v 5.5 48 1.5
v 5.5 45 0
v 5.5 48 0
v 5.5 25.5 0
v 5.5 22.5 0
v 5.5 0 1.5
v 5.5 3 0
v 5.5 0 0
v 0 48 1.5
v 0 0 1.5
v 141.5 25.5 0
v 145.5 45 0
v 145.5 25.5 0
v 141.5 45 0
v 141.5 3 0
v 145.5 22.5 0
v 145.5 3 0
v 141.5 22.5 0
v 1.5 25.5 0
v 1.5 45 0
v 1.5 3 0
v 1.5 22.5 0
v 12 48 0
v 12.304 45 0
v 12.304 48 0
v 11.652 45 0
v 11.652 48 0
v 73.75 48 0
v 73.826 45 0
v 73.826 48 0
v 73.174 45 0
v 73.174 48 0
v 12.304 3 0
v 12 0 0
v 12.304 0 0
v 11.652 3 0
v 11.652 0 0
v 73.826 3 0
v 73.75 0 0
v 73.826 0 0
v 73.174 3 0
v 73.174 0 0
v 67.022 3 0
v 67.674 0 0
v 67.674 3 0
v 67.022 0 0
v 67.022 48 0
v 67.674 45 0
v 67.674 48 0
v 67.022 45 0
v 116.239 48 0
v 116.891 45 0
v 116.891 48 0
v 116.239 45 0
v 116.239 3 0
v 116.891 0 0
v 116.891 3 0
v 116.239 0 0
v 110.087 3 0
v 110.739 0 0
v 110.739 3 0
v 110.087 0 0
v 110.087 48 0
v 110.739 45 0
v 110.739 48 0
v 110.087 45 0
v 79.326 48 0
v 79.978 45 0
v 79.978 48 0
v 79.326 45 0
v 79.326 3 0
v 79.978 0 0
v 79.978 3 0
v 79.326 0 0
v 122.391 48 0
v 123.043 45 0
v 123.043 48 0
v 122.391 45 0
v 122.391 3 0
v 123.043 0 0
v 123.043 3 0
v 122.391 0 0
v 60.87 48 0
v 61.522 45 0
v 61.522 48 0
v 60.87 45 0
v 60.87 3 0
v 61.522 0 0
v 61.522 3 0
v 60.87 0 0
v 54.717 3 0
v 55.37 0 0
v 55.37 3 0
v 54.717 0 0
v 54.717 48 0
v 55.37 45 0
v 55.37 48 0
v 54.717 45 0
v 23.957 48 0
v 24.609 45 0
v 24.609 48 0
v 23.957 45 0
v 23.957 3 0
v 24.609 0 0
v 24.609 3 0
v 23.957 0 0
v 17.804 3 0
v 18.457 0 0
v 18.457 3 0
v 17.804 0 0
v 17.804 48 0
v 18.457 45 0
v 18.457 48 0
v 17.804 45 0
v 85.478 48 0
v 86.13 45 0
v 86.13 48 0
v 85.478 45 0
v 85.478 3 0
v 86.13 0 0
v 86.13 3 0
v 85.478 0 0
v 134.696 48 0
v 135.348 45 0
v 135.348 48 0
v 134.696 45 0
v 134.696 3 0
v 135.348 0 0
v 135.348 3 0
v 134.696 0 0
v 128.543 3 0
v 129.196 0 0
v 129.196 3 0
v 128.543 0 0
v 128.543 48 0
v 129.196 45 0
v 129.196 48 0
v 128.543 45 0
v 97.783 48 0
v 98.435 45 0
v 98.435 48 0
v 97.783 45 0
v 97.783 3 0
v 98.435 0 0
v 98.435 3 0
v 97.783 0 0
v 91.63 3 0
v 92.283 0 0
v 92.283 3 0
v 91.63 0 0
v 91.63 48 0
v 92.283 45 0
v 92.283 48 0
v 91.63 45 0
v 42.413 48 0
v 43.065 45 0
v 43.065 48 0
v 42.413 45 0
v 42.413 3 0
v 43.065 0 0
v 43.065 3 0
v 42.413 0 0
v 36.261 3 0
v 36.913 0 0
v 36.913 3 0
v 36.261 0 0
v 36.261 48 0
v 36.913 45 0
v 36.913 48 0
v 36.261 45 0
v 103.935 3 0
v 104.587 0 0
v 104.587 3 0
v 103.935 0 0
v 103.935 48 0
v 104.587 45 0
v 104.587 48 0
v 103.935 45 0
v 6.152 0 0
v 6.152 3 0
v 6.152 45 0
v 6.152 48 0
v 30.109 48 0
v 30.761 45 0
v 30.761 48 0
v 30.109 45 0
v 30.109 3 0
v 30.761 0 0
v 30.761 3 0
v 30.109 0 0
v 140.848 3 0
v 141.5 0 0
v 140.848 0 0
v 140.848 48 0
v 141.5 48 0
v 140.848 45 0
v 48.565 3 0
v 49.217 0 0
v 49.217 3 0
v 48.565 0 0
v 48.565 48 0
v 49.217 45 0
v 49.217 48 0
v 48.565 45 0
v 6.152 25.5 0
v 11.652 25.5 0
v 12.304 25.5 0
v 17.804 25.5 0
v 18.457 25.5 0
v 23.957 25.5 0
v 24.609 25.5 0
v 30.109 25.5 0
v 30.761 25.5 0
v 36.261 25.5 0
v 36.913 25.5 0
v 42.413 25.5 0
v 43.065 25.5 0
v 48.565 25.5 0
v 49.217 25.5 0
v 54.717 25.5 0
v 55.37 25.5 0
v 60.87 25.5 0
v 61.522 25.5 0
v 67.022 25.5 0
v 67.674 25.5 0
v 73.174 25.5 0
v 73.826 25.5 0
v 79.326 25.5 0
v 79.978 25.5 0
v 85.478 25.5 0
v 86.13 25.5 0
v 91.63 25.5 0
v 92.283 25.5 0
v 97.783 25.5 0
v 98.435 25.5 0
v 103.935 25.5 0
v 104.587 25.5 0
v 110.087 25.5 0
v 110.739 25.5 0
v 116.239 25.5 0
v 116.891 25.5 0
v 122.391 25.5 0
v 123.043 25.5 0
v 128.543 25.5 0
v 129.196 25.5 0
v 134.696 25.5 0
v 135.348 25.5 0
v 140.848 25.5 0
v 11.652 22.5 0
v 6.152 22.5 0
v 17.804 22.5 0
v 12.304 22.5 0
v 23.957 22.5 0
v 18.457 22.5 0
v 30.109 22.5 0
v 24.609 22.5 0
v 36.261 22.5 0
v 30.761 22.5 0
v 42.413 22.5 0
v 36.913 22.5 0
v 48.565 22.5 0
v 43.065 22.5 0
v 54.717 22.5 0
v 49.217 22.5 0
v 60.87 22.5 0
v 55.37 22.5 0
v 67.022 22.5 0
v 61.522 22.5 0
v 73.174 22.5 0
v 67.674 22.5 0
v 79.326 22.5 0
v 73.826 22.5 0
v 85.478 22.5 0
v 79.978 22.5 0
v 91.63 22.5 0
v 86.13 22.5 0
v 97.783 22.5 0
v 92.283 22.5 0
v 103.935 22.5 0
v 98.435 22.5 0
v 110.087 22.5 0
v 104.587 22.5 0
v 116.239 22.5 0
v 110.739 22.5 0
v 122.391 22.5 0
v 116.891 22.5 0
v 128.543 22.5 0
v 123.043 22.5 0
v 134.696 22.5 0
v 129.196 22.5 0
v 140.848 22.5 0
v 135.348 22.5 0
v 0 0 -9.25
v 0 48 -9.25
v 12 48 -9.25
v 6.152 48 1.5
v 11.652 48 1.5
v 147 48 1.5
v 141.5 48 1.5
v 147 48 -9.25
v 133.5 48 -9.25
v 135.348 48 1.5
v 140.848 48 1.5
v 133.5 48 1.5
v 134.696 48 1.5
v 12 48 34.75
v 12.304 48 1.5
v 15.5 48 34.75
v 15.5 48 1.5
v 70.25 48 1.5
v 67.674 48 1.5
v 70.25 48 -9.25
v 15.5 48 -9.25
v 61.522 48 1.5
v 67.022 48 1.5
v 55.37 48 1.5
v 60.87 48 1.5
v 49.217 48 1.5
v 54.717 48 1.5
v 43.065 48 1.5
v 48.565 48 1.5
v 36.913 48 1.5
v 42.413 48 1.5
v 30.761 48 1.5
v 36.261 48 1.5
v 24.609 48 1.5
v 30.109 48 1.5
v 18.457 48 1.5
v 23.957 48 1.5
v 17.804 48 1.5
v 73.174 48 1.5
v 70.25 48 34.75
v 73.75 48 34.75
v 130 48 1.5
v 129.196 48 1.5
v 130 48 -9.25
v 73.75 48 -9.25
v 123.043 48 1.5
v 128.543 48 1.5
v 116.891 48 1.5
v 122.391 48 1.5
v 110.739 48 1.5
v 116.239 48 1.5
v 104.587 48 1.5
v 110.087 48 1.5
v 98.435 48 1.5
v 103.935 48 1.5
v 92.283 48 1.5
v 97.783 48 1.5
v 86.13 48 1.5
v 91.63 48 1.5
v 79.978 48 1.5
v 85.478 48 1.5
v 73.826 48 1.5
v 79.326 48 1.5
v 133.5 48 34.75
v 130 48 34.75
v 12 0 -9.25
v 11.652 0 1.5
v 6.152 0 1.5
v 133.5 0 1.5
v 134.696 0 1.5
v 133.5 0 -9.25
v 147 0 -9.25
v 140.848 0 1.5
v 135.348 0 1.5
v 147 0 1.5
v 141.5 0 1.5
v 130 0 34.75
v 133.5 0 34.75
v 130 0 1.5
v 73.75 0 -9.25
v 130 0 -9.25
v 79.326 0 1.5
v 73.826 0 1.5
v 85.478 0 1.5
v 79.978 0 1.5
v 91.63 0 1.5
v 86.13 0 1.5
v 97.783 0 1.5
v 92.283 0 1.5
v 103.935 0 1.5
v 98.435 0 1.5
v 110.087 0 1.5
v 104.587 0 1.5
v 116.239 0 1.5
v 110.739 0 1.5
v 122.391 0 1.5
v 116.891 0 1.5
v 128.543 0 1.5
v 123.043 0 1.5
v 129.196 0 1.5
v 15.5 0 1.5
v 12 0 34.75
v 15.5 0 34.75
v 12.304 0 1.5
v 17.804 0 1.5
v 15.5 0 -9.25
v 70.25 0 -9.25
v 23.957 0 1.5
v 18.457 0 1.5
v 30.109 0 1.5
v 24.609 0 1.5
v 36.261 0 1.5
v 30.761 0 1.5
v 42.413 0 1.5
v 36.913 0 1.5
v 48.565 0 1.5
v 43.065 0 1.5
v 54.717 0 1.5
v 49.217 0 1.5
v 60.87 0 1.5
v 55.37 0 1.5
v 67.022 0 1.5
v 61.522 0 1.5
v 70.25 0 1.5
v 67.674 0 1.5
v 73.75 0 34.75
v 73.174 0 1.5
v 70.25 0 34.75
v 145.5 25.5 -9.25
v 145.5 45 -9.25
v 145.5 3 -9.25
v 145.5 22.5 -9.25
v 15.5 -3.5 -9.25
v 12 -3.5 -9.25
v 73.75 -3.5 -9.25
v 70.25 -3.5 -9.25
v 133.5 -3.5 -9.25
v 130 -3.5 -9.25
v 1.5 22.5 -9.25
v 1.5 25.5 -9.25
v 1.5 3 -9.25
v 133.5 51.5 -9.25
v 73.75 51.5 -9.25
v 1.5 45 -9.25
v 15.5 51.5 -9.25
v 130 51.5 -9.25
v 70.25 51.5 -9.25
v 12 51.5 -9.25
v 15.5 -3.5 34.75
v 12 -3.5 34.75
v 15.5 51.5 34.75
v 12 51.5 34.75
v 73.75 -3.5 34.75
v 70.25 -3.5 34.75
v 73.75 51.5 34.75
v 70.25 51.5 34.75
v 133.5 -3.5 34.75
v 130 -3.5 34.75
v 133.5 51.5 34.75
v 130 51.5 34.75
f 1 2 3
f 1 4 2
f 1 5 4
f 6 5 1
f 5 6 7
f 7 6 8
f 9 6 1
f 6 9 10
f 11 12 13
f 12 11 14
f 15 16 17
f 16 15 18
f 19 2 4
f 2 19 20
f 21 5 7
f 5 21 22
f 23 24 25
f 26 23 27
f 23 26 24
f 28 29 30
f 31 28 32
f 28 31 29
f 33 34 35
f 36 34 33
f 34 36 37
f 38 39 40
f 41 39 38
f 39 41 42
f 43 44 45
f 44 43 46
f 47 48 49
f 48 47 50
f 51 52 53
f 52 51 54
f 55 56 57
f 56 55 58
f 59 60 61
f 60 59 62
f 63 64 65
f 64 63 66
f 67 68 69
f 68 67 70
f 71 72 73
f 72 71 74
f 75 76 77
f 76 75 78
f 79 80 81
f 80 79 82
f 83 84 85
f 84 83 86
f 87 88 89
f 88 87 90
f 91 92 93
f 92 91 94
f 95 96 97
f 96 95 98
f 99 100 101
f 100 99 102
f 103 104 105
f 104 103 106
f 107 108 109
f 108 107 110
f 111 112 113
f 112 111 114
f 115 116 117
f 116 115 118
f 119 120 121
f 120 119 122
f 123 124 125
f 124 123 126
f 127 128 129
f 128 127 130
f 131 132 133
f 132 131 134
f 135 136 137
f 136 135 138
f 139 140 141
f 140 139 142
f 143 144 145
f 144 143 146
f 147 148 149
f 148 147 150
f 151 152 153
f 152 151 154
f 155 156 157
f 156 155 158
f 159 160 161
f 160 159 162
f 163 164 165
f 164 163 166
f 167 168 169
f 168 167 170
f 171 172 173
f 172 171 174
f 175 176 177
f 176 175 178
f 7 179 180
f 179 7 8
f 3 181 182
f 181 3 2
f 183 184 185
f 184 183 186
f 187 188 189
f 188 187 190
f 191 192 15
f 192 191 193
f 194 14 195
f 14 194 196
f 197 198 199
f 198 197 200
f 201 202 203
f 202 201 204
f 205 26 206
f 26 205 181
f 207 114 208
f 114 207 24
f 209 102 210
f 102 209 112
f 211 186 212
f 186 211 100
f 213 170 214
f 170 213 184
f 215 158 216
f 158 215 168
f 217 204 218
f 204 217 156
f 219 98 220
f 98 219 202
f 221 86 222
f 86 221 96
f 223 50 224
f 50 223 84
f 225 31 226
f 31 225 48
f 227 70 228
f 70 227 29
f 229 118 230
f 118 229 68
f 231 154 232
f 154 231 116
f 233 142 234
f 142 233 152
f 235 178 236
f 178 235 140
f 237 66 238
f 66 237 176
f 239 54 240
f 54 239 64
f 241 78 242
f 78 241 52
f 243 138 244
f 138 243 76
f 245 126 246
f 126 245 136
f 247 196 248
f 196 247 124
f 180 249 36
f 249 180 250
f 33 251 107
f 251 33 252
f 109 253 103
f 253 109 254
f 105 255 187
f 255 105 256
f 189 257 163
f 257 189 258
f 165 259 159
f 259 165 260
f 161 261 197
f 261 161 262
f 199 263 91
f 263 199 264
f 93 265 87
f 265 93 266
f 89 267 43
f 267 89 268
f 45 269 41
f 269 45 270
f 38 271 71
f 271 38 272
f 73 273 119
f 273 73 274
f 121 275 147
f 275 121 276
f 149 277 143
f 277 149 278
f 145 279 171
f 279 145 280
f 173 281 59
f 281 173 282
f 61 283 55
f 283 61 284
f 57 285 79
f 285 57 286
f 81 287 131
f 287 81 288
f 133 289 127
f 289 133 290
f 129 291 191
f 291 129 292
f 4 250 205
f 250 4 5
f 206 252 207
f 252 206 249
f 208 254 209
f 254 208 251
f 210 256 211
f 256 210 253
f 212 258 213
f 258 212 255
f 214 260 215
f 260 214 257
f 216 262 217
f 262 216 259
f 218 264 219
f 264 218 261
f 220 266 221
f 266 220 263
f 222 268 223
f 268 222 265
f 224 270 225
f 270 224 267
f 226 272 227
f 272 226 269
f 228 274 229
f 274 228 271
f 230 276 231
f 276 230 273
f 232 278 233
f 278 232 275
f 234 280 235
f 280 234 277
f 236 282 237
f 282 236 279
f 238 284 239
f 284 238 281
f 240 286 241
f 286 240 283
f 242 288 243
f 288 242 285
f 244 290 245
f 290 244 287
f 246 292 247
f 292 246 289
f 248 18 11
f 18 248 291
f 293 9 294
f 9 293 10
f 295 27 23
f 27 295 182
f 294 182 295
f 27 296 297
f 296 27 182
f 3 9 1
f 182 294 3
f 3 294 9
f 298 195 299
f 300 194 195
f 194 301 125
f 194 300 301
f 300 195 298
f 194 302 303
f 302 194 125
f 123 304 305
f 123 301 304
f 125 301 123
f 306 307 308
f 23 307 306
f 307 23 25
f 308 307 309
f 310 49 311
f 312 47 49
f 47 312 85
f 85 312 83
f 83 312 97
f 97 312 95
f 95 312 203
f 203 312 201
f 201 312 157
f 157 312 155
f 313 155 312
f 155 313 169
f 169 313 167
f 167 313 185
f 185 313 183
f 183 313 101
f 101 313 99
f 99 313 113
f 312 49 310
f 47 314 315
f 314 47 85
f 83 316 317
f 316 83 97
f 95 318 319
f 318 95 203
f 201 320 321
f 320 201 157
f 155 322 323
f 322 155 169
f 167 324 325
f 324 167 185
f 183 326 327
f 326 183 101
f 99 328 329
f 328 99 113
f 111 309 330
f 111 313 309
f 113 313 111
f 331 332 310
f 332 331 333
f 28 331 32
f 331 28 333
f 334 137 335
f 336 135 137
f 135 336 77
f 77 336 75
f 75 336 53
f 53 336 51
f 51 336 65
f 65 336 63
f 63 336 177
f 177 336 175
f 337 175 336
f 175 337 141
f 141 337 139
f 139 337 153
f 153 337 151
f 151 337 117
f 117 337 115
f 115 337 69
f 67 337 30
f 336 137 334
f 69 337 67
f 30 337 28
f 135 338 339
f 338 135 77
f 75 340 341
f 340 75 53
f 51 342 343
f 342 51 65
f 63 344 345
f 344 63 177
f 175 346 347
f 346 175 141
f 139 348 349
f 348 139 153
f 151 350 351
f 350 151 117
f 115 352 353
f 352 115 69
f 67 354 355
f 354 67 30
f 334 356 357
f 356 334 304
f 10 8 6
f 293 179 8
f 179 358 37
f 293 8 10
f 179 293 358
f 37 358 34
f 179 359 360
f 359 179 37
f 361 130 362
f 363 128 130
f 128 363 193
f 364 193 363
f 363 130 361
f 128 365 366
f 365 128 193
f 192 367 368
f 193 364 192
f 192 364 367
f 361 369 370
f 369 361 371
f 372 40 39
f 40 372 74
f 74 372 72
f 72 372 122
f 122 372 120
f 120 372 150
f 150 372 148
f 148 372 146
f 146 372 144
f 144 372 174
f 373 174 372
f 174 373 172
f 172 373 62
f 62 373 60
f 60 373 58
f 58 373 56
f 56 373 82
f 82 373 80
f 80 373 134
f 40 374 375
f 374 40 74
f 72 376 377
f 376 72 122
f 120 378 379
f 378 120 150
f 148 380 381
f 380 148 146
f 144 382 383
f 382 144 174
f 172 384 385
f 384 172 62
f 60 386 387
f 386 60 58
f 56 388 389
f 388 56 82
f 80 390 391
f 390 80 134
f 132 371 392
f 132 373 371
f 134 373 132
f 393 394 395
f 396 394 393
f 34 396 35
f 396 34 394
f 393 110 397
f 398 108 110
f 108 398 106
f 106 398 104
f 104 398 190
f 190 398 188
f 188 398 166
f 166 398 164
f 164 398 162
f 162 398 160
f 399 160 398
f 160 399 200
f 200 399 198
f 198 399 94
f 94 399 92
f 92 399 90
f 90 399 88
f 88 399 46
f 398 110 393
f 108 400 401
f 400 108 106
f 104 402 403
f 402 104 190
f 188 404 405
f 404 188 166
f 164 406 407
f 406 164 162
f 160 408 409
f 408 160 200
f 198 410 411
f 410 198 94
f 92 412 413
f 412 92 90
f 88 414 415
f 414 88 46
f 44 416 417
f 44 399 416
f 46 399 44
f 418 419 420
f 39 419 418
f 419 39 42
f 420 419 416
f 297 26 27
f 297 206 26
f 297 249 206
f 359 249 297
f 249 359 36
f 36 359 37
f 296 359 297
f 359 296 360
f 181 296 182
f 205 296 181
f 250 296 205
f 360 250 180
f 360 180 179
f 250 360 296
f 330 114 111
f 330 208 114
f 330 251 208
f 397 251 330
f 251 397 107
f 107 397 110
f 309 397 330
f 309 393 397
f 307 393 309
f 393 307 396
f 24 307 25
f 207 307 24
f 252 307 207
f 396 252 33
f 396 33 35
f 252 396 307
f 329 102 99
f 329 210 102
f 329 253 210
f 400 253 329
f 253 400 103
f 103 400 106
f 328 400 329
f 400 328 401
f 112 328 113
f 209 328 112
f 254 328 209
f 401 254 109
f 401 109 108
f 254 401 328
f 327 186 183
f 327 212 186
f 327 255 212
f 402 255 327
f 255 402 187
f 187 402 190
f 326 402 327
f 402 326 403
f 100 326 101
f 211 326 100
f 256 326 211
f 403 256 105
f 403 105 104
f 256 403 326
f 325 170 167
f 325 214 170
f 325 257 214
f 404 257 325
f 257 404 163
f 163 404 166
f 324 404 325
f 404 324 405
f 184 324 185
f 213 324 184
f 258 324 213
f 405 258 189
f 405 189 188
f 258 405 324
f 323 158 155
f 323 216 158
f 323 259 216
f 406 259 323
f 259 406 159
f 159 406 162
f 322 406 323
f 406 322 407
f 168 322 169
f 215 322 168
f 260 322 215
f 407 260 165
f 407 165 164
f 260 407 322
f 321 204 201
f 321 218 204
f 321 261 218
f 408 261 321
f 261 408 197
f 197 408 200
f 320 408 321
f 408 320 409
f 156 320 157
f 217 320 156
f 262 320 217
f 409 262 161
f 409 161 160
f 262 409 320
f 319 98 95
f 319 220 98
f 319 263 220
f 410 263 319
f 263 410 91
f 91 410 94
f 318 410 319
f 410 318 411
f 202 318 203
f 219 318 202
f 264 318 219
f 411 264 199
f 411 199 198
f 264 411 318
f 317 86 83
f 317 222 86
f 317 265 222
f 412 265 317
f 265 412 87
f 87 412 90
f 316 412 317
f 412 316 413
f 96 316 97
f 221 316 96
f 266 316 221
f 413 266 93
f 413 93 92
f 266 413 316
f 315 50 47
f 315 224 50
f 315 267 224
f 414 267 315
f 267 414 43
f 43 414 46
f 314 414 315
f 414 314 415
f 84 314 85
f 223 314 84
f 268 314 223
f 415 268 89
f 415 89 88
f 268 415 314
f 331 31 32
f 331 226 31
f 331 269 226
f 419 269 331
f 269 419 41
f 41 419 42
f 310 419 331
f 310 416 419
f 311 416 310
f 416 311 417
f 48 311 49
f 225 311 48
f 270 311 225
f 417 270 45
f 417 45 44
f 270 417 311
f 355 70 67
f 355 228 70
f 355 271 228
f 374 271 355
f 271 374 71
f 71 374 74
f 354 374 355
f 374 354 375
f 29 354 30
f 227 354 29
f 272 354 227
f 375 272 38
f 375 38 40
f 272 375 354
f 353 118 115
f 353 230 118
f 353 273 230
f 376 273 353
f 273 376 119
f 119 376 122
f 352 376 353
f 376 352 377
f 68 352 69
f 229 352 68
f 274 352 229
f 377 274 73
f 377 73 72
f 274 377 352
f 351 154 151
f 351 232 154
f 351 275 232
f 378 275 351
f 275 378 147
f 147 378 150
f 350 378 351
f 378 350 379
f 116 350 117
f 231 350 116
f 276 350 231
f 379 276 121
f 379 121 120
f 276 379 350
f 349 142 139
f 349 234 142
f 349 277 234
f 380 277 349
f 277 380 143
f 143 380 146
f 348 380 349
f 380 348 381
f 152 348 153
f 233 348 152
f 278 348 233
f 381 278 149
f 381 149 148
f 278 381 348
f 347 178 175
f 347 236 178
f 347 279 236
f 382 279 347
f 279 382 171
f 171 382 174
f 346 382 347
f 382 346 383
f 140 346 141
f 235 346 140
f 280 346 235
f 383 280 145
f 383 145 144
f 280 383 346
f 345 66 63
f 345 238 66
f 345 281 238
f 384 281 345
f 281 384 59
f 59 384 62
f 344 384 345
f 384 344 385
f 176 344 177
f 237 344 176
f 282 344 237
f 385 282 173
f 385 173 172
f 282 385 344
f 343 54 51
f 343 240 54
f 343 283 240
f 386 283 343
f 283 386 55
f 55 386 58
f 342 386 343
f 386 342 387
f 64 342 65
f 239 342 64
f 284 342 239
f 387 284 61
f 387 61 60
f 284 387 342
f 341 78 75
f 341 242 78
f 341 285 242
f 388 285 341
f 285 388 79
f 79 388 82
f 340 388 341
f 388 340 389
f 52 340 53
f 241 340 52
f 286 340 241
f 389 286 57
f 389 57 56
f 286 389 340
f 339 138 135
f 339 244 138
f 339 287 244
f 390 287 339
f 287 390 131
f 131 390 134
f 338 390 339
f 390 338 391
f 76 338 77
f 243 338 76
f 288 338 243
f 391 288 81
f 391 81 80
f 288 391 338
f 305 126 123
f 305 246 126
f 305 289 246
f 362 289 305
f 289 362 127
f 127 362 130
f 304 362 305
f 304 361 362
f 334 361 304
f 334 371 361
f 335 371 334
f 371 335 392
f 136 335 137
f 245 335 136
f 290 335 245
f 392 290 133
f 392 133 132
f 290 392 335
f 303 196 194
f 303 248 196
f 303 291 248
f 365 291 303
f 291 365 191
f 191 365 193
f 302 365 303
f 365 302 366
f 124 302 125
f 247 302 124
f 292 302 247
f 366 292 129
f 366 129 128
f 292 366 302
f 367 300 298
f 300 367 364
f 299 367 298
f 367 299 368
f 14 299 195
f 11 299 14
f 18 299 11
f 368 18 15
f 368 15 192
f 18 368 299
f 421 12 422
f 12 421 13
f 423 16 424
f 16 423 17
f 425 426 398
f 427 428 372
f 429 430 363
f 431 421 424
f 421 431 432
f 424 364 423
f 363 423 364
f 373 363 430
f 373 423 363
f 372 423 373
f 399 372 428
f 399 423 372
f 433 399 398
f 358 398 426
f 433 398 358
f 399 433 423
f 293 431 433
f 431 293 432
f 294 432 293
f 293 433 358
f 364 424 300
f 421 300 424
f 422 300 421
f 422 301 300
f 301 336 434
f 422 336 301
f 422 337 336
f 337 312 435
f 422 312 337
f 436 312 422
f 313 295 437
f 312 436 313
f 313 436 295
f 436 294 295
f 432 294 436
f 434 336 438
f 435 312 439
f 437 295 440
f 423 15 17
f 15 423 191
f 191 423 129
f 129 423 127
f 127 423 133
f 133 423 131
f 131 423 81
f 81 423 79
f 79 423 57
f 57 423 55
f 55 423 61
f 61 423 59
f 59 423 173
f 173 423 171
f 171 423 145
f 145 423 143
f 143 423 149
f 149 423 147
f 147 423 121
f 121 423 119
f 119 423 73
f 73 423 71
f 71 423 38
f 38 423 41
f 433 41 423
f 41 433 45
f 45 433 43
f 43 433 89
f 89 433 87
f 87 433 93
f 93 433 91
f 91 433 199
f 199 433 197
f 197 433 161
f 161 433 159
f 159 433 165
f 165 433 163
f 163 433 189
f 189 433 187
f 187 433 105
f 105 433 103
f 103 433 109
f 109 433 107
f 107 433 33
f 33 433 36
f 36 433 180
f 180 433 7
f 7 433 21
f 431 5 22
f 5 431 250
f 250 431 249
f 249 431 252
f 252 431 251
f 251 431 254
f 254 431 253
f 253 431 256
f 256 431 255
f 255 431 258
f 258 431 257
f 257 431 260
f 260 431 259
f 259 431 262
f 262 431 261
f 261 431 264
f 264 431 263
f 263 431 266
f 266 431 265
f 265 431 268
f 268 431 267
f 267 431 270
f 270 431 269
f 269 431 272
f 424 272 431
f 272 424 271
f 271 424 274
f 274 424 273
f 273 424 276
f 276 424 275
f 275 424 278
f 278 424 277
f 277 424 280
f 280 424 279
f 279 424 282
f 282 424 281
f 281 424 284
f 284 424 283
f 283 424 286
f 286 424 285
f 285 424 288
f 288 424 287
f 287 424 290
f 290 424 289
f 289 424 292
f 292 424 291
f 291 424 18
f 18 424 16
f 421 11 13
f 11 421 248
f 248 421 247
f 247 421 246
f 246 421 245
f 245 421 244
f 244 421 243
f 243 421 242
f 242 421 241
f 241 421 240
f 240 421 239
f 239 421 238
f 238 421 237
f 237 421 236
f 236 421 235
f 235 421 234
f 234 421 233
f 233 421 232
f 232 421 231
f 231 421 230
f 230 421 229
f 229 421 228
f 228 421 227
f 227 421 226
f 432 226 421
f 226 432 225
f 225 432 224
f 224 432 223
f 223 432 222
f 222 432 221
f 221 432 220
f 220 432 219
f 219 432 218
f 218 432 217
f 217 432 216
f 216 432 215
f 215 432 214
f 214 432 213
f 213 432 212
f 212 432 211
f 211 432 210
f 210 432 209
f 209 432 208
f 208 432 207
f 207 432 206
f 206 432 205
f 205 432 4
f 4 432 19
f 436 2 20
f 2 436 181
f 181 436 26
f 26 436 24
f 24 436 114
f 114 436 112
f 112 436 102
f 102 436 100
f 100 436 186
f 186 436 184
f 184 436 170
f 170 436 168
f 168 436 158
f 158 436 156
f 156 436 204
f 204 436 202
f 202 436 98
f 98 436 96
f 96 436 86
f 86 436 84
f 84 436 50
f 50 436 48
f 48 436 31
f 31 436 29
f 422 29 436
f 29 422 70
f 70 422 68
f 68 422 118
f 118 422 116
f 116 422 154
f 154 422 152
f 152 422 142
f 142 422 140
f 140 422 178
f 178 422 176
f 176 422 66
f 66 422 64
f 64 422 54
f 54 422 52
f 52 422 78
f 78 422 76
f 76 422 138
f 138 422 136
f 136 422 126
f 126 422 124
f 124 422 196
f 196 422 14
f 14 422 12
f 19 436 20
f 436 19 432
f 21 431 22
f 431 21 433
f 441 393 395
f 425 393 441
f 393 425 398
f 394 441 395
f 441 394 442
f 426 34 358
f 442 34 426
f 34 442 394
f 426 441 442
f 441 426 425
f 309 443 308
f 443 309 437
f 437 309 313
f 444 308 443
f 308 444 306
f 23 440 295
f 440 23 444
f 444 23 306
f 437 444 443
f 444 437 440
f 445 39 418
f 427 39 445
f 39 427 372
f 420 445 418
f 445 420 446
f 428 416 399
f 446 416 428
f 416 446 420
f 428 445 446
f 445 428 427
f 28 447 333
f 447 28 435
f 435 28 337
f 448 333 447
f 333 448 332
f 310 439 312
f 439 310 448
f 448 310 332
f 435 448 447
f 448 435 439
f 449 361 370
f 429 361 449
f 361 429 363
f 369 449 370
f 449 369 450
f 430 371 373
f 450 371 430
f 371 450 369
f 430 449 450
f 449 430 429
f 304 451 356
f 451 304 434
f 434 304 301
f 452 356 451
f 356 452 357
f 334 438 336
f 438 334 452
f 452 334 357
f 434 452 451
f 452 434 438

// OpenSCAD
module tread()
{
    color ("SandyBrown")
        cube ([5.5,48,1.5]);
}
module stringer()
{
    color ("Chocolate")
        cube ([12*12+1.5,1.5,9.25]);
}
module backwall()
{
    color ("LightGray")
        cube ([1.5,48,9.25]);
}
module post()
{
    color ("tomato")
        cube ([3.5,3.5,44]);
}
for (dx = [0:6+3.5/23:12*12]) {
    translate ([dx,0,0]) tread();
}
for (dy = [0,1.5,24-1.5,24,48-2*1.5,48-1.5]) {
    translate ([0,dy,-9.25]) stringer();
}
for (dx = [0,12*12+1.5]) {
    translate ([dx,0,-9.25])
        backwall();
}
for (dx = [12,6*12-3.5/2,12*12+1.5-12-3.5]) {
    translate ([dx,-3.5,-9.25])
        post();
    translate ([dx,48,-9.25])
        post();
}
